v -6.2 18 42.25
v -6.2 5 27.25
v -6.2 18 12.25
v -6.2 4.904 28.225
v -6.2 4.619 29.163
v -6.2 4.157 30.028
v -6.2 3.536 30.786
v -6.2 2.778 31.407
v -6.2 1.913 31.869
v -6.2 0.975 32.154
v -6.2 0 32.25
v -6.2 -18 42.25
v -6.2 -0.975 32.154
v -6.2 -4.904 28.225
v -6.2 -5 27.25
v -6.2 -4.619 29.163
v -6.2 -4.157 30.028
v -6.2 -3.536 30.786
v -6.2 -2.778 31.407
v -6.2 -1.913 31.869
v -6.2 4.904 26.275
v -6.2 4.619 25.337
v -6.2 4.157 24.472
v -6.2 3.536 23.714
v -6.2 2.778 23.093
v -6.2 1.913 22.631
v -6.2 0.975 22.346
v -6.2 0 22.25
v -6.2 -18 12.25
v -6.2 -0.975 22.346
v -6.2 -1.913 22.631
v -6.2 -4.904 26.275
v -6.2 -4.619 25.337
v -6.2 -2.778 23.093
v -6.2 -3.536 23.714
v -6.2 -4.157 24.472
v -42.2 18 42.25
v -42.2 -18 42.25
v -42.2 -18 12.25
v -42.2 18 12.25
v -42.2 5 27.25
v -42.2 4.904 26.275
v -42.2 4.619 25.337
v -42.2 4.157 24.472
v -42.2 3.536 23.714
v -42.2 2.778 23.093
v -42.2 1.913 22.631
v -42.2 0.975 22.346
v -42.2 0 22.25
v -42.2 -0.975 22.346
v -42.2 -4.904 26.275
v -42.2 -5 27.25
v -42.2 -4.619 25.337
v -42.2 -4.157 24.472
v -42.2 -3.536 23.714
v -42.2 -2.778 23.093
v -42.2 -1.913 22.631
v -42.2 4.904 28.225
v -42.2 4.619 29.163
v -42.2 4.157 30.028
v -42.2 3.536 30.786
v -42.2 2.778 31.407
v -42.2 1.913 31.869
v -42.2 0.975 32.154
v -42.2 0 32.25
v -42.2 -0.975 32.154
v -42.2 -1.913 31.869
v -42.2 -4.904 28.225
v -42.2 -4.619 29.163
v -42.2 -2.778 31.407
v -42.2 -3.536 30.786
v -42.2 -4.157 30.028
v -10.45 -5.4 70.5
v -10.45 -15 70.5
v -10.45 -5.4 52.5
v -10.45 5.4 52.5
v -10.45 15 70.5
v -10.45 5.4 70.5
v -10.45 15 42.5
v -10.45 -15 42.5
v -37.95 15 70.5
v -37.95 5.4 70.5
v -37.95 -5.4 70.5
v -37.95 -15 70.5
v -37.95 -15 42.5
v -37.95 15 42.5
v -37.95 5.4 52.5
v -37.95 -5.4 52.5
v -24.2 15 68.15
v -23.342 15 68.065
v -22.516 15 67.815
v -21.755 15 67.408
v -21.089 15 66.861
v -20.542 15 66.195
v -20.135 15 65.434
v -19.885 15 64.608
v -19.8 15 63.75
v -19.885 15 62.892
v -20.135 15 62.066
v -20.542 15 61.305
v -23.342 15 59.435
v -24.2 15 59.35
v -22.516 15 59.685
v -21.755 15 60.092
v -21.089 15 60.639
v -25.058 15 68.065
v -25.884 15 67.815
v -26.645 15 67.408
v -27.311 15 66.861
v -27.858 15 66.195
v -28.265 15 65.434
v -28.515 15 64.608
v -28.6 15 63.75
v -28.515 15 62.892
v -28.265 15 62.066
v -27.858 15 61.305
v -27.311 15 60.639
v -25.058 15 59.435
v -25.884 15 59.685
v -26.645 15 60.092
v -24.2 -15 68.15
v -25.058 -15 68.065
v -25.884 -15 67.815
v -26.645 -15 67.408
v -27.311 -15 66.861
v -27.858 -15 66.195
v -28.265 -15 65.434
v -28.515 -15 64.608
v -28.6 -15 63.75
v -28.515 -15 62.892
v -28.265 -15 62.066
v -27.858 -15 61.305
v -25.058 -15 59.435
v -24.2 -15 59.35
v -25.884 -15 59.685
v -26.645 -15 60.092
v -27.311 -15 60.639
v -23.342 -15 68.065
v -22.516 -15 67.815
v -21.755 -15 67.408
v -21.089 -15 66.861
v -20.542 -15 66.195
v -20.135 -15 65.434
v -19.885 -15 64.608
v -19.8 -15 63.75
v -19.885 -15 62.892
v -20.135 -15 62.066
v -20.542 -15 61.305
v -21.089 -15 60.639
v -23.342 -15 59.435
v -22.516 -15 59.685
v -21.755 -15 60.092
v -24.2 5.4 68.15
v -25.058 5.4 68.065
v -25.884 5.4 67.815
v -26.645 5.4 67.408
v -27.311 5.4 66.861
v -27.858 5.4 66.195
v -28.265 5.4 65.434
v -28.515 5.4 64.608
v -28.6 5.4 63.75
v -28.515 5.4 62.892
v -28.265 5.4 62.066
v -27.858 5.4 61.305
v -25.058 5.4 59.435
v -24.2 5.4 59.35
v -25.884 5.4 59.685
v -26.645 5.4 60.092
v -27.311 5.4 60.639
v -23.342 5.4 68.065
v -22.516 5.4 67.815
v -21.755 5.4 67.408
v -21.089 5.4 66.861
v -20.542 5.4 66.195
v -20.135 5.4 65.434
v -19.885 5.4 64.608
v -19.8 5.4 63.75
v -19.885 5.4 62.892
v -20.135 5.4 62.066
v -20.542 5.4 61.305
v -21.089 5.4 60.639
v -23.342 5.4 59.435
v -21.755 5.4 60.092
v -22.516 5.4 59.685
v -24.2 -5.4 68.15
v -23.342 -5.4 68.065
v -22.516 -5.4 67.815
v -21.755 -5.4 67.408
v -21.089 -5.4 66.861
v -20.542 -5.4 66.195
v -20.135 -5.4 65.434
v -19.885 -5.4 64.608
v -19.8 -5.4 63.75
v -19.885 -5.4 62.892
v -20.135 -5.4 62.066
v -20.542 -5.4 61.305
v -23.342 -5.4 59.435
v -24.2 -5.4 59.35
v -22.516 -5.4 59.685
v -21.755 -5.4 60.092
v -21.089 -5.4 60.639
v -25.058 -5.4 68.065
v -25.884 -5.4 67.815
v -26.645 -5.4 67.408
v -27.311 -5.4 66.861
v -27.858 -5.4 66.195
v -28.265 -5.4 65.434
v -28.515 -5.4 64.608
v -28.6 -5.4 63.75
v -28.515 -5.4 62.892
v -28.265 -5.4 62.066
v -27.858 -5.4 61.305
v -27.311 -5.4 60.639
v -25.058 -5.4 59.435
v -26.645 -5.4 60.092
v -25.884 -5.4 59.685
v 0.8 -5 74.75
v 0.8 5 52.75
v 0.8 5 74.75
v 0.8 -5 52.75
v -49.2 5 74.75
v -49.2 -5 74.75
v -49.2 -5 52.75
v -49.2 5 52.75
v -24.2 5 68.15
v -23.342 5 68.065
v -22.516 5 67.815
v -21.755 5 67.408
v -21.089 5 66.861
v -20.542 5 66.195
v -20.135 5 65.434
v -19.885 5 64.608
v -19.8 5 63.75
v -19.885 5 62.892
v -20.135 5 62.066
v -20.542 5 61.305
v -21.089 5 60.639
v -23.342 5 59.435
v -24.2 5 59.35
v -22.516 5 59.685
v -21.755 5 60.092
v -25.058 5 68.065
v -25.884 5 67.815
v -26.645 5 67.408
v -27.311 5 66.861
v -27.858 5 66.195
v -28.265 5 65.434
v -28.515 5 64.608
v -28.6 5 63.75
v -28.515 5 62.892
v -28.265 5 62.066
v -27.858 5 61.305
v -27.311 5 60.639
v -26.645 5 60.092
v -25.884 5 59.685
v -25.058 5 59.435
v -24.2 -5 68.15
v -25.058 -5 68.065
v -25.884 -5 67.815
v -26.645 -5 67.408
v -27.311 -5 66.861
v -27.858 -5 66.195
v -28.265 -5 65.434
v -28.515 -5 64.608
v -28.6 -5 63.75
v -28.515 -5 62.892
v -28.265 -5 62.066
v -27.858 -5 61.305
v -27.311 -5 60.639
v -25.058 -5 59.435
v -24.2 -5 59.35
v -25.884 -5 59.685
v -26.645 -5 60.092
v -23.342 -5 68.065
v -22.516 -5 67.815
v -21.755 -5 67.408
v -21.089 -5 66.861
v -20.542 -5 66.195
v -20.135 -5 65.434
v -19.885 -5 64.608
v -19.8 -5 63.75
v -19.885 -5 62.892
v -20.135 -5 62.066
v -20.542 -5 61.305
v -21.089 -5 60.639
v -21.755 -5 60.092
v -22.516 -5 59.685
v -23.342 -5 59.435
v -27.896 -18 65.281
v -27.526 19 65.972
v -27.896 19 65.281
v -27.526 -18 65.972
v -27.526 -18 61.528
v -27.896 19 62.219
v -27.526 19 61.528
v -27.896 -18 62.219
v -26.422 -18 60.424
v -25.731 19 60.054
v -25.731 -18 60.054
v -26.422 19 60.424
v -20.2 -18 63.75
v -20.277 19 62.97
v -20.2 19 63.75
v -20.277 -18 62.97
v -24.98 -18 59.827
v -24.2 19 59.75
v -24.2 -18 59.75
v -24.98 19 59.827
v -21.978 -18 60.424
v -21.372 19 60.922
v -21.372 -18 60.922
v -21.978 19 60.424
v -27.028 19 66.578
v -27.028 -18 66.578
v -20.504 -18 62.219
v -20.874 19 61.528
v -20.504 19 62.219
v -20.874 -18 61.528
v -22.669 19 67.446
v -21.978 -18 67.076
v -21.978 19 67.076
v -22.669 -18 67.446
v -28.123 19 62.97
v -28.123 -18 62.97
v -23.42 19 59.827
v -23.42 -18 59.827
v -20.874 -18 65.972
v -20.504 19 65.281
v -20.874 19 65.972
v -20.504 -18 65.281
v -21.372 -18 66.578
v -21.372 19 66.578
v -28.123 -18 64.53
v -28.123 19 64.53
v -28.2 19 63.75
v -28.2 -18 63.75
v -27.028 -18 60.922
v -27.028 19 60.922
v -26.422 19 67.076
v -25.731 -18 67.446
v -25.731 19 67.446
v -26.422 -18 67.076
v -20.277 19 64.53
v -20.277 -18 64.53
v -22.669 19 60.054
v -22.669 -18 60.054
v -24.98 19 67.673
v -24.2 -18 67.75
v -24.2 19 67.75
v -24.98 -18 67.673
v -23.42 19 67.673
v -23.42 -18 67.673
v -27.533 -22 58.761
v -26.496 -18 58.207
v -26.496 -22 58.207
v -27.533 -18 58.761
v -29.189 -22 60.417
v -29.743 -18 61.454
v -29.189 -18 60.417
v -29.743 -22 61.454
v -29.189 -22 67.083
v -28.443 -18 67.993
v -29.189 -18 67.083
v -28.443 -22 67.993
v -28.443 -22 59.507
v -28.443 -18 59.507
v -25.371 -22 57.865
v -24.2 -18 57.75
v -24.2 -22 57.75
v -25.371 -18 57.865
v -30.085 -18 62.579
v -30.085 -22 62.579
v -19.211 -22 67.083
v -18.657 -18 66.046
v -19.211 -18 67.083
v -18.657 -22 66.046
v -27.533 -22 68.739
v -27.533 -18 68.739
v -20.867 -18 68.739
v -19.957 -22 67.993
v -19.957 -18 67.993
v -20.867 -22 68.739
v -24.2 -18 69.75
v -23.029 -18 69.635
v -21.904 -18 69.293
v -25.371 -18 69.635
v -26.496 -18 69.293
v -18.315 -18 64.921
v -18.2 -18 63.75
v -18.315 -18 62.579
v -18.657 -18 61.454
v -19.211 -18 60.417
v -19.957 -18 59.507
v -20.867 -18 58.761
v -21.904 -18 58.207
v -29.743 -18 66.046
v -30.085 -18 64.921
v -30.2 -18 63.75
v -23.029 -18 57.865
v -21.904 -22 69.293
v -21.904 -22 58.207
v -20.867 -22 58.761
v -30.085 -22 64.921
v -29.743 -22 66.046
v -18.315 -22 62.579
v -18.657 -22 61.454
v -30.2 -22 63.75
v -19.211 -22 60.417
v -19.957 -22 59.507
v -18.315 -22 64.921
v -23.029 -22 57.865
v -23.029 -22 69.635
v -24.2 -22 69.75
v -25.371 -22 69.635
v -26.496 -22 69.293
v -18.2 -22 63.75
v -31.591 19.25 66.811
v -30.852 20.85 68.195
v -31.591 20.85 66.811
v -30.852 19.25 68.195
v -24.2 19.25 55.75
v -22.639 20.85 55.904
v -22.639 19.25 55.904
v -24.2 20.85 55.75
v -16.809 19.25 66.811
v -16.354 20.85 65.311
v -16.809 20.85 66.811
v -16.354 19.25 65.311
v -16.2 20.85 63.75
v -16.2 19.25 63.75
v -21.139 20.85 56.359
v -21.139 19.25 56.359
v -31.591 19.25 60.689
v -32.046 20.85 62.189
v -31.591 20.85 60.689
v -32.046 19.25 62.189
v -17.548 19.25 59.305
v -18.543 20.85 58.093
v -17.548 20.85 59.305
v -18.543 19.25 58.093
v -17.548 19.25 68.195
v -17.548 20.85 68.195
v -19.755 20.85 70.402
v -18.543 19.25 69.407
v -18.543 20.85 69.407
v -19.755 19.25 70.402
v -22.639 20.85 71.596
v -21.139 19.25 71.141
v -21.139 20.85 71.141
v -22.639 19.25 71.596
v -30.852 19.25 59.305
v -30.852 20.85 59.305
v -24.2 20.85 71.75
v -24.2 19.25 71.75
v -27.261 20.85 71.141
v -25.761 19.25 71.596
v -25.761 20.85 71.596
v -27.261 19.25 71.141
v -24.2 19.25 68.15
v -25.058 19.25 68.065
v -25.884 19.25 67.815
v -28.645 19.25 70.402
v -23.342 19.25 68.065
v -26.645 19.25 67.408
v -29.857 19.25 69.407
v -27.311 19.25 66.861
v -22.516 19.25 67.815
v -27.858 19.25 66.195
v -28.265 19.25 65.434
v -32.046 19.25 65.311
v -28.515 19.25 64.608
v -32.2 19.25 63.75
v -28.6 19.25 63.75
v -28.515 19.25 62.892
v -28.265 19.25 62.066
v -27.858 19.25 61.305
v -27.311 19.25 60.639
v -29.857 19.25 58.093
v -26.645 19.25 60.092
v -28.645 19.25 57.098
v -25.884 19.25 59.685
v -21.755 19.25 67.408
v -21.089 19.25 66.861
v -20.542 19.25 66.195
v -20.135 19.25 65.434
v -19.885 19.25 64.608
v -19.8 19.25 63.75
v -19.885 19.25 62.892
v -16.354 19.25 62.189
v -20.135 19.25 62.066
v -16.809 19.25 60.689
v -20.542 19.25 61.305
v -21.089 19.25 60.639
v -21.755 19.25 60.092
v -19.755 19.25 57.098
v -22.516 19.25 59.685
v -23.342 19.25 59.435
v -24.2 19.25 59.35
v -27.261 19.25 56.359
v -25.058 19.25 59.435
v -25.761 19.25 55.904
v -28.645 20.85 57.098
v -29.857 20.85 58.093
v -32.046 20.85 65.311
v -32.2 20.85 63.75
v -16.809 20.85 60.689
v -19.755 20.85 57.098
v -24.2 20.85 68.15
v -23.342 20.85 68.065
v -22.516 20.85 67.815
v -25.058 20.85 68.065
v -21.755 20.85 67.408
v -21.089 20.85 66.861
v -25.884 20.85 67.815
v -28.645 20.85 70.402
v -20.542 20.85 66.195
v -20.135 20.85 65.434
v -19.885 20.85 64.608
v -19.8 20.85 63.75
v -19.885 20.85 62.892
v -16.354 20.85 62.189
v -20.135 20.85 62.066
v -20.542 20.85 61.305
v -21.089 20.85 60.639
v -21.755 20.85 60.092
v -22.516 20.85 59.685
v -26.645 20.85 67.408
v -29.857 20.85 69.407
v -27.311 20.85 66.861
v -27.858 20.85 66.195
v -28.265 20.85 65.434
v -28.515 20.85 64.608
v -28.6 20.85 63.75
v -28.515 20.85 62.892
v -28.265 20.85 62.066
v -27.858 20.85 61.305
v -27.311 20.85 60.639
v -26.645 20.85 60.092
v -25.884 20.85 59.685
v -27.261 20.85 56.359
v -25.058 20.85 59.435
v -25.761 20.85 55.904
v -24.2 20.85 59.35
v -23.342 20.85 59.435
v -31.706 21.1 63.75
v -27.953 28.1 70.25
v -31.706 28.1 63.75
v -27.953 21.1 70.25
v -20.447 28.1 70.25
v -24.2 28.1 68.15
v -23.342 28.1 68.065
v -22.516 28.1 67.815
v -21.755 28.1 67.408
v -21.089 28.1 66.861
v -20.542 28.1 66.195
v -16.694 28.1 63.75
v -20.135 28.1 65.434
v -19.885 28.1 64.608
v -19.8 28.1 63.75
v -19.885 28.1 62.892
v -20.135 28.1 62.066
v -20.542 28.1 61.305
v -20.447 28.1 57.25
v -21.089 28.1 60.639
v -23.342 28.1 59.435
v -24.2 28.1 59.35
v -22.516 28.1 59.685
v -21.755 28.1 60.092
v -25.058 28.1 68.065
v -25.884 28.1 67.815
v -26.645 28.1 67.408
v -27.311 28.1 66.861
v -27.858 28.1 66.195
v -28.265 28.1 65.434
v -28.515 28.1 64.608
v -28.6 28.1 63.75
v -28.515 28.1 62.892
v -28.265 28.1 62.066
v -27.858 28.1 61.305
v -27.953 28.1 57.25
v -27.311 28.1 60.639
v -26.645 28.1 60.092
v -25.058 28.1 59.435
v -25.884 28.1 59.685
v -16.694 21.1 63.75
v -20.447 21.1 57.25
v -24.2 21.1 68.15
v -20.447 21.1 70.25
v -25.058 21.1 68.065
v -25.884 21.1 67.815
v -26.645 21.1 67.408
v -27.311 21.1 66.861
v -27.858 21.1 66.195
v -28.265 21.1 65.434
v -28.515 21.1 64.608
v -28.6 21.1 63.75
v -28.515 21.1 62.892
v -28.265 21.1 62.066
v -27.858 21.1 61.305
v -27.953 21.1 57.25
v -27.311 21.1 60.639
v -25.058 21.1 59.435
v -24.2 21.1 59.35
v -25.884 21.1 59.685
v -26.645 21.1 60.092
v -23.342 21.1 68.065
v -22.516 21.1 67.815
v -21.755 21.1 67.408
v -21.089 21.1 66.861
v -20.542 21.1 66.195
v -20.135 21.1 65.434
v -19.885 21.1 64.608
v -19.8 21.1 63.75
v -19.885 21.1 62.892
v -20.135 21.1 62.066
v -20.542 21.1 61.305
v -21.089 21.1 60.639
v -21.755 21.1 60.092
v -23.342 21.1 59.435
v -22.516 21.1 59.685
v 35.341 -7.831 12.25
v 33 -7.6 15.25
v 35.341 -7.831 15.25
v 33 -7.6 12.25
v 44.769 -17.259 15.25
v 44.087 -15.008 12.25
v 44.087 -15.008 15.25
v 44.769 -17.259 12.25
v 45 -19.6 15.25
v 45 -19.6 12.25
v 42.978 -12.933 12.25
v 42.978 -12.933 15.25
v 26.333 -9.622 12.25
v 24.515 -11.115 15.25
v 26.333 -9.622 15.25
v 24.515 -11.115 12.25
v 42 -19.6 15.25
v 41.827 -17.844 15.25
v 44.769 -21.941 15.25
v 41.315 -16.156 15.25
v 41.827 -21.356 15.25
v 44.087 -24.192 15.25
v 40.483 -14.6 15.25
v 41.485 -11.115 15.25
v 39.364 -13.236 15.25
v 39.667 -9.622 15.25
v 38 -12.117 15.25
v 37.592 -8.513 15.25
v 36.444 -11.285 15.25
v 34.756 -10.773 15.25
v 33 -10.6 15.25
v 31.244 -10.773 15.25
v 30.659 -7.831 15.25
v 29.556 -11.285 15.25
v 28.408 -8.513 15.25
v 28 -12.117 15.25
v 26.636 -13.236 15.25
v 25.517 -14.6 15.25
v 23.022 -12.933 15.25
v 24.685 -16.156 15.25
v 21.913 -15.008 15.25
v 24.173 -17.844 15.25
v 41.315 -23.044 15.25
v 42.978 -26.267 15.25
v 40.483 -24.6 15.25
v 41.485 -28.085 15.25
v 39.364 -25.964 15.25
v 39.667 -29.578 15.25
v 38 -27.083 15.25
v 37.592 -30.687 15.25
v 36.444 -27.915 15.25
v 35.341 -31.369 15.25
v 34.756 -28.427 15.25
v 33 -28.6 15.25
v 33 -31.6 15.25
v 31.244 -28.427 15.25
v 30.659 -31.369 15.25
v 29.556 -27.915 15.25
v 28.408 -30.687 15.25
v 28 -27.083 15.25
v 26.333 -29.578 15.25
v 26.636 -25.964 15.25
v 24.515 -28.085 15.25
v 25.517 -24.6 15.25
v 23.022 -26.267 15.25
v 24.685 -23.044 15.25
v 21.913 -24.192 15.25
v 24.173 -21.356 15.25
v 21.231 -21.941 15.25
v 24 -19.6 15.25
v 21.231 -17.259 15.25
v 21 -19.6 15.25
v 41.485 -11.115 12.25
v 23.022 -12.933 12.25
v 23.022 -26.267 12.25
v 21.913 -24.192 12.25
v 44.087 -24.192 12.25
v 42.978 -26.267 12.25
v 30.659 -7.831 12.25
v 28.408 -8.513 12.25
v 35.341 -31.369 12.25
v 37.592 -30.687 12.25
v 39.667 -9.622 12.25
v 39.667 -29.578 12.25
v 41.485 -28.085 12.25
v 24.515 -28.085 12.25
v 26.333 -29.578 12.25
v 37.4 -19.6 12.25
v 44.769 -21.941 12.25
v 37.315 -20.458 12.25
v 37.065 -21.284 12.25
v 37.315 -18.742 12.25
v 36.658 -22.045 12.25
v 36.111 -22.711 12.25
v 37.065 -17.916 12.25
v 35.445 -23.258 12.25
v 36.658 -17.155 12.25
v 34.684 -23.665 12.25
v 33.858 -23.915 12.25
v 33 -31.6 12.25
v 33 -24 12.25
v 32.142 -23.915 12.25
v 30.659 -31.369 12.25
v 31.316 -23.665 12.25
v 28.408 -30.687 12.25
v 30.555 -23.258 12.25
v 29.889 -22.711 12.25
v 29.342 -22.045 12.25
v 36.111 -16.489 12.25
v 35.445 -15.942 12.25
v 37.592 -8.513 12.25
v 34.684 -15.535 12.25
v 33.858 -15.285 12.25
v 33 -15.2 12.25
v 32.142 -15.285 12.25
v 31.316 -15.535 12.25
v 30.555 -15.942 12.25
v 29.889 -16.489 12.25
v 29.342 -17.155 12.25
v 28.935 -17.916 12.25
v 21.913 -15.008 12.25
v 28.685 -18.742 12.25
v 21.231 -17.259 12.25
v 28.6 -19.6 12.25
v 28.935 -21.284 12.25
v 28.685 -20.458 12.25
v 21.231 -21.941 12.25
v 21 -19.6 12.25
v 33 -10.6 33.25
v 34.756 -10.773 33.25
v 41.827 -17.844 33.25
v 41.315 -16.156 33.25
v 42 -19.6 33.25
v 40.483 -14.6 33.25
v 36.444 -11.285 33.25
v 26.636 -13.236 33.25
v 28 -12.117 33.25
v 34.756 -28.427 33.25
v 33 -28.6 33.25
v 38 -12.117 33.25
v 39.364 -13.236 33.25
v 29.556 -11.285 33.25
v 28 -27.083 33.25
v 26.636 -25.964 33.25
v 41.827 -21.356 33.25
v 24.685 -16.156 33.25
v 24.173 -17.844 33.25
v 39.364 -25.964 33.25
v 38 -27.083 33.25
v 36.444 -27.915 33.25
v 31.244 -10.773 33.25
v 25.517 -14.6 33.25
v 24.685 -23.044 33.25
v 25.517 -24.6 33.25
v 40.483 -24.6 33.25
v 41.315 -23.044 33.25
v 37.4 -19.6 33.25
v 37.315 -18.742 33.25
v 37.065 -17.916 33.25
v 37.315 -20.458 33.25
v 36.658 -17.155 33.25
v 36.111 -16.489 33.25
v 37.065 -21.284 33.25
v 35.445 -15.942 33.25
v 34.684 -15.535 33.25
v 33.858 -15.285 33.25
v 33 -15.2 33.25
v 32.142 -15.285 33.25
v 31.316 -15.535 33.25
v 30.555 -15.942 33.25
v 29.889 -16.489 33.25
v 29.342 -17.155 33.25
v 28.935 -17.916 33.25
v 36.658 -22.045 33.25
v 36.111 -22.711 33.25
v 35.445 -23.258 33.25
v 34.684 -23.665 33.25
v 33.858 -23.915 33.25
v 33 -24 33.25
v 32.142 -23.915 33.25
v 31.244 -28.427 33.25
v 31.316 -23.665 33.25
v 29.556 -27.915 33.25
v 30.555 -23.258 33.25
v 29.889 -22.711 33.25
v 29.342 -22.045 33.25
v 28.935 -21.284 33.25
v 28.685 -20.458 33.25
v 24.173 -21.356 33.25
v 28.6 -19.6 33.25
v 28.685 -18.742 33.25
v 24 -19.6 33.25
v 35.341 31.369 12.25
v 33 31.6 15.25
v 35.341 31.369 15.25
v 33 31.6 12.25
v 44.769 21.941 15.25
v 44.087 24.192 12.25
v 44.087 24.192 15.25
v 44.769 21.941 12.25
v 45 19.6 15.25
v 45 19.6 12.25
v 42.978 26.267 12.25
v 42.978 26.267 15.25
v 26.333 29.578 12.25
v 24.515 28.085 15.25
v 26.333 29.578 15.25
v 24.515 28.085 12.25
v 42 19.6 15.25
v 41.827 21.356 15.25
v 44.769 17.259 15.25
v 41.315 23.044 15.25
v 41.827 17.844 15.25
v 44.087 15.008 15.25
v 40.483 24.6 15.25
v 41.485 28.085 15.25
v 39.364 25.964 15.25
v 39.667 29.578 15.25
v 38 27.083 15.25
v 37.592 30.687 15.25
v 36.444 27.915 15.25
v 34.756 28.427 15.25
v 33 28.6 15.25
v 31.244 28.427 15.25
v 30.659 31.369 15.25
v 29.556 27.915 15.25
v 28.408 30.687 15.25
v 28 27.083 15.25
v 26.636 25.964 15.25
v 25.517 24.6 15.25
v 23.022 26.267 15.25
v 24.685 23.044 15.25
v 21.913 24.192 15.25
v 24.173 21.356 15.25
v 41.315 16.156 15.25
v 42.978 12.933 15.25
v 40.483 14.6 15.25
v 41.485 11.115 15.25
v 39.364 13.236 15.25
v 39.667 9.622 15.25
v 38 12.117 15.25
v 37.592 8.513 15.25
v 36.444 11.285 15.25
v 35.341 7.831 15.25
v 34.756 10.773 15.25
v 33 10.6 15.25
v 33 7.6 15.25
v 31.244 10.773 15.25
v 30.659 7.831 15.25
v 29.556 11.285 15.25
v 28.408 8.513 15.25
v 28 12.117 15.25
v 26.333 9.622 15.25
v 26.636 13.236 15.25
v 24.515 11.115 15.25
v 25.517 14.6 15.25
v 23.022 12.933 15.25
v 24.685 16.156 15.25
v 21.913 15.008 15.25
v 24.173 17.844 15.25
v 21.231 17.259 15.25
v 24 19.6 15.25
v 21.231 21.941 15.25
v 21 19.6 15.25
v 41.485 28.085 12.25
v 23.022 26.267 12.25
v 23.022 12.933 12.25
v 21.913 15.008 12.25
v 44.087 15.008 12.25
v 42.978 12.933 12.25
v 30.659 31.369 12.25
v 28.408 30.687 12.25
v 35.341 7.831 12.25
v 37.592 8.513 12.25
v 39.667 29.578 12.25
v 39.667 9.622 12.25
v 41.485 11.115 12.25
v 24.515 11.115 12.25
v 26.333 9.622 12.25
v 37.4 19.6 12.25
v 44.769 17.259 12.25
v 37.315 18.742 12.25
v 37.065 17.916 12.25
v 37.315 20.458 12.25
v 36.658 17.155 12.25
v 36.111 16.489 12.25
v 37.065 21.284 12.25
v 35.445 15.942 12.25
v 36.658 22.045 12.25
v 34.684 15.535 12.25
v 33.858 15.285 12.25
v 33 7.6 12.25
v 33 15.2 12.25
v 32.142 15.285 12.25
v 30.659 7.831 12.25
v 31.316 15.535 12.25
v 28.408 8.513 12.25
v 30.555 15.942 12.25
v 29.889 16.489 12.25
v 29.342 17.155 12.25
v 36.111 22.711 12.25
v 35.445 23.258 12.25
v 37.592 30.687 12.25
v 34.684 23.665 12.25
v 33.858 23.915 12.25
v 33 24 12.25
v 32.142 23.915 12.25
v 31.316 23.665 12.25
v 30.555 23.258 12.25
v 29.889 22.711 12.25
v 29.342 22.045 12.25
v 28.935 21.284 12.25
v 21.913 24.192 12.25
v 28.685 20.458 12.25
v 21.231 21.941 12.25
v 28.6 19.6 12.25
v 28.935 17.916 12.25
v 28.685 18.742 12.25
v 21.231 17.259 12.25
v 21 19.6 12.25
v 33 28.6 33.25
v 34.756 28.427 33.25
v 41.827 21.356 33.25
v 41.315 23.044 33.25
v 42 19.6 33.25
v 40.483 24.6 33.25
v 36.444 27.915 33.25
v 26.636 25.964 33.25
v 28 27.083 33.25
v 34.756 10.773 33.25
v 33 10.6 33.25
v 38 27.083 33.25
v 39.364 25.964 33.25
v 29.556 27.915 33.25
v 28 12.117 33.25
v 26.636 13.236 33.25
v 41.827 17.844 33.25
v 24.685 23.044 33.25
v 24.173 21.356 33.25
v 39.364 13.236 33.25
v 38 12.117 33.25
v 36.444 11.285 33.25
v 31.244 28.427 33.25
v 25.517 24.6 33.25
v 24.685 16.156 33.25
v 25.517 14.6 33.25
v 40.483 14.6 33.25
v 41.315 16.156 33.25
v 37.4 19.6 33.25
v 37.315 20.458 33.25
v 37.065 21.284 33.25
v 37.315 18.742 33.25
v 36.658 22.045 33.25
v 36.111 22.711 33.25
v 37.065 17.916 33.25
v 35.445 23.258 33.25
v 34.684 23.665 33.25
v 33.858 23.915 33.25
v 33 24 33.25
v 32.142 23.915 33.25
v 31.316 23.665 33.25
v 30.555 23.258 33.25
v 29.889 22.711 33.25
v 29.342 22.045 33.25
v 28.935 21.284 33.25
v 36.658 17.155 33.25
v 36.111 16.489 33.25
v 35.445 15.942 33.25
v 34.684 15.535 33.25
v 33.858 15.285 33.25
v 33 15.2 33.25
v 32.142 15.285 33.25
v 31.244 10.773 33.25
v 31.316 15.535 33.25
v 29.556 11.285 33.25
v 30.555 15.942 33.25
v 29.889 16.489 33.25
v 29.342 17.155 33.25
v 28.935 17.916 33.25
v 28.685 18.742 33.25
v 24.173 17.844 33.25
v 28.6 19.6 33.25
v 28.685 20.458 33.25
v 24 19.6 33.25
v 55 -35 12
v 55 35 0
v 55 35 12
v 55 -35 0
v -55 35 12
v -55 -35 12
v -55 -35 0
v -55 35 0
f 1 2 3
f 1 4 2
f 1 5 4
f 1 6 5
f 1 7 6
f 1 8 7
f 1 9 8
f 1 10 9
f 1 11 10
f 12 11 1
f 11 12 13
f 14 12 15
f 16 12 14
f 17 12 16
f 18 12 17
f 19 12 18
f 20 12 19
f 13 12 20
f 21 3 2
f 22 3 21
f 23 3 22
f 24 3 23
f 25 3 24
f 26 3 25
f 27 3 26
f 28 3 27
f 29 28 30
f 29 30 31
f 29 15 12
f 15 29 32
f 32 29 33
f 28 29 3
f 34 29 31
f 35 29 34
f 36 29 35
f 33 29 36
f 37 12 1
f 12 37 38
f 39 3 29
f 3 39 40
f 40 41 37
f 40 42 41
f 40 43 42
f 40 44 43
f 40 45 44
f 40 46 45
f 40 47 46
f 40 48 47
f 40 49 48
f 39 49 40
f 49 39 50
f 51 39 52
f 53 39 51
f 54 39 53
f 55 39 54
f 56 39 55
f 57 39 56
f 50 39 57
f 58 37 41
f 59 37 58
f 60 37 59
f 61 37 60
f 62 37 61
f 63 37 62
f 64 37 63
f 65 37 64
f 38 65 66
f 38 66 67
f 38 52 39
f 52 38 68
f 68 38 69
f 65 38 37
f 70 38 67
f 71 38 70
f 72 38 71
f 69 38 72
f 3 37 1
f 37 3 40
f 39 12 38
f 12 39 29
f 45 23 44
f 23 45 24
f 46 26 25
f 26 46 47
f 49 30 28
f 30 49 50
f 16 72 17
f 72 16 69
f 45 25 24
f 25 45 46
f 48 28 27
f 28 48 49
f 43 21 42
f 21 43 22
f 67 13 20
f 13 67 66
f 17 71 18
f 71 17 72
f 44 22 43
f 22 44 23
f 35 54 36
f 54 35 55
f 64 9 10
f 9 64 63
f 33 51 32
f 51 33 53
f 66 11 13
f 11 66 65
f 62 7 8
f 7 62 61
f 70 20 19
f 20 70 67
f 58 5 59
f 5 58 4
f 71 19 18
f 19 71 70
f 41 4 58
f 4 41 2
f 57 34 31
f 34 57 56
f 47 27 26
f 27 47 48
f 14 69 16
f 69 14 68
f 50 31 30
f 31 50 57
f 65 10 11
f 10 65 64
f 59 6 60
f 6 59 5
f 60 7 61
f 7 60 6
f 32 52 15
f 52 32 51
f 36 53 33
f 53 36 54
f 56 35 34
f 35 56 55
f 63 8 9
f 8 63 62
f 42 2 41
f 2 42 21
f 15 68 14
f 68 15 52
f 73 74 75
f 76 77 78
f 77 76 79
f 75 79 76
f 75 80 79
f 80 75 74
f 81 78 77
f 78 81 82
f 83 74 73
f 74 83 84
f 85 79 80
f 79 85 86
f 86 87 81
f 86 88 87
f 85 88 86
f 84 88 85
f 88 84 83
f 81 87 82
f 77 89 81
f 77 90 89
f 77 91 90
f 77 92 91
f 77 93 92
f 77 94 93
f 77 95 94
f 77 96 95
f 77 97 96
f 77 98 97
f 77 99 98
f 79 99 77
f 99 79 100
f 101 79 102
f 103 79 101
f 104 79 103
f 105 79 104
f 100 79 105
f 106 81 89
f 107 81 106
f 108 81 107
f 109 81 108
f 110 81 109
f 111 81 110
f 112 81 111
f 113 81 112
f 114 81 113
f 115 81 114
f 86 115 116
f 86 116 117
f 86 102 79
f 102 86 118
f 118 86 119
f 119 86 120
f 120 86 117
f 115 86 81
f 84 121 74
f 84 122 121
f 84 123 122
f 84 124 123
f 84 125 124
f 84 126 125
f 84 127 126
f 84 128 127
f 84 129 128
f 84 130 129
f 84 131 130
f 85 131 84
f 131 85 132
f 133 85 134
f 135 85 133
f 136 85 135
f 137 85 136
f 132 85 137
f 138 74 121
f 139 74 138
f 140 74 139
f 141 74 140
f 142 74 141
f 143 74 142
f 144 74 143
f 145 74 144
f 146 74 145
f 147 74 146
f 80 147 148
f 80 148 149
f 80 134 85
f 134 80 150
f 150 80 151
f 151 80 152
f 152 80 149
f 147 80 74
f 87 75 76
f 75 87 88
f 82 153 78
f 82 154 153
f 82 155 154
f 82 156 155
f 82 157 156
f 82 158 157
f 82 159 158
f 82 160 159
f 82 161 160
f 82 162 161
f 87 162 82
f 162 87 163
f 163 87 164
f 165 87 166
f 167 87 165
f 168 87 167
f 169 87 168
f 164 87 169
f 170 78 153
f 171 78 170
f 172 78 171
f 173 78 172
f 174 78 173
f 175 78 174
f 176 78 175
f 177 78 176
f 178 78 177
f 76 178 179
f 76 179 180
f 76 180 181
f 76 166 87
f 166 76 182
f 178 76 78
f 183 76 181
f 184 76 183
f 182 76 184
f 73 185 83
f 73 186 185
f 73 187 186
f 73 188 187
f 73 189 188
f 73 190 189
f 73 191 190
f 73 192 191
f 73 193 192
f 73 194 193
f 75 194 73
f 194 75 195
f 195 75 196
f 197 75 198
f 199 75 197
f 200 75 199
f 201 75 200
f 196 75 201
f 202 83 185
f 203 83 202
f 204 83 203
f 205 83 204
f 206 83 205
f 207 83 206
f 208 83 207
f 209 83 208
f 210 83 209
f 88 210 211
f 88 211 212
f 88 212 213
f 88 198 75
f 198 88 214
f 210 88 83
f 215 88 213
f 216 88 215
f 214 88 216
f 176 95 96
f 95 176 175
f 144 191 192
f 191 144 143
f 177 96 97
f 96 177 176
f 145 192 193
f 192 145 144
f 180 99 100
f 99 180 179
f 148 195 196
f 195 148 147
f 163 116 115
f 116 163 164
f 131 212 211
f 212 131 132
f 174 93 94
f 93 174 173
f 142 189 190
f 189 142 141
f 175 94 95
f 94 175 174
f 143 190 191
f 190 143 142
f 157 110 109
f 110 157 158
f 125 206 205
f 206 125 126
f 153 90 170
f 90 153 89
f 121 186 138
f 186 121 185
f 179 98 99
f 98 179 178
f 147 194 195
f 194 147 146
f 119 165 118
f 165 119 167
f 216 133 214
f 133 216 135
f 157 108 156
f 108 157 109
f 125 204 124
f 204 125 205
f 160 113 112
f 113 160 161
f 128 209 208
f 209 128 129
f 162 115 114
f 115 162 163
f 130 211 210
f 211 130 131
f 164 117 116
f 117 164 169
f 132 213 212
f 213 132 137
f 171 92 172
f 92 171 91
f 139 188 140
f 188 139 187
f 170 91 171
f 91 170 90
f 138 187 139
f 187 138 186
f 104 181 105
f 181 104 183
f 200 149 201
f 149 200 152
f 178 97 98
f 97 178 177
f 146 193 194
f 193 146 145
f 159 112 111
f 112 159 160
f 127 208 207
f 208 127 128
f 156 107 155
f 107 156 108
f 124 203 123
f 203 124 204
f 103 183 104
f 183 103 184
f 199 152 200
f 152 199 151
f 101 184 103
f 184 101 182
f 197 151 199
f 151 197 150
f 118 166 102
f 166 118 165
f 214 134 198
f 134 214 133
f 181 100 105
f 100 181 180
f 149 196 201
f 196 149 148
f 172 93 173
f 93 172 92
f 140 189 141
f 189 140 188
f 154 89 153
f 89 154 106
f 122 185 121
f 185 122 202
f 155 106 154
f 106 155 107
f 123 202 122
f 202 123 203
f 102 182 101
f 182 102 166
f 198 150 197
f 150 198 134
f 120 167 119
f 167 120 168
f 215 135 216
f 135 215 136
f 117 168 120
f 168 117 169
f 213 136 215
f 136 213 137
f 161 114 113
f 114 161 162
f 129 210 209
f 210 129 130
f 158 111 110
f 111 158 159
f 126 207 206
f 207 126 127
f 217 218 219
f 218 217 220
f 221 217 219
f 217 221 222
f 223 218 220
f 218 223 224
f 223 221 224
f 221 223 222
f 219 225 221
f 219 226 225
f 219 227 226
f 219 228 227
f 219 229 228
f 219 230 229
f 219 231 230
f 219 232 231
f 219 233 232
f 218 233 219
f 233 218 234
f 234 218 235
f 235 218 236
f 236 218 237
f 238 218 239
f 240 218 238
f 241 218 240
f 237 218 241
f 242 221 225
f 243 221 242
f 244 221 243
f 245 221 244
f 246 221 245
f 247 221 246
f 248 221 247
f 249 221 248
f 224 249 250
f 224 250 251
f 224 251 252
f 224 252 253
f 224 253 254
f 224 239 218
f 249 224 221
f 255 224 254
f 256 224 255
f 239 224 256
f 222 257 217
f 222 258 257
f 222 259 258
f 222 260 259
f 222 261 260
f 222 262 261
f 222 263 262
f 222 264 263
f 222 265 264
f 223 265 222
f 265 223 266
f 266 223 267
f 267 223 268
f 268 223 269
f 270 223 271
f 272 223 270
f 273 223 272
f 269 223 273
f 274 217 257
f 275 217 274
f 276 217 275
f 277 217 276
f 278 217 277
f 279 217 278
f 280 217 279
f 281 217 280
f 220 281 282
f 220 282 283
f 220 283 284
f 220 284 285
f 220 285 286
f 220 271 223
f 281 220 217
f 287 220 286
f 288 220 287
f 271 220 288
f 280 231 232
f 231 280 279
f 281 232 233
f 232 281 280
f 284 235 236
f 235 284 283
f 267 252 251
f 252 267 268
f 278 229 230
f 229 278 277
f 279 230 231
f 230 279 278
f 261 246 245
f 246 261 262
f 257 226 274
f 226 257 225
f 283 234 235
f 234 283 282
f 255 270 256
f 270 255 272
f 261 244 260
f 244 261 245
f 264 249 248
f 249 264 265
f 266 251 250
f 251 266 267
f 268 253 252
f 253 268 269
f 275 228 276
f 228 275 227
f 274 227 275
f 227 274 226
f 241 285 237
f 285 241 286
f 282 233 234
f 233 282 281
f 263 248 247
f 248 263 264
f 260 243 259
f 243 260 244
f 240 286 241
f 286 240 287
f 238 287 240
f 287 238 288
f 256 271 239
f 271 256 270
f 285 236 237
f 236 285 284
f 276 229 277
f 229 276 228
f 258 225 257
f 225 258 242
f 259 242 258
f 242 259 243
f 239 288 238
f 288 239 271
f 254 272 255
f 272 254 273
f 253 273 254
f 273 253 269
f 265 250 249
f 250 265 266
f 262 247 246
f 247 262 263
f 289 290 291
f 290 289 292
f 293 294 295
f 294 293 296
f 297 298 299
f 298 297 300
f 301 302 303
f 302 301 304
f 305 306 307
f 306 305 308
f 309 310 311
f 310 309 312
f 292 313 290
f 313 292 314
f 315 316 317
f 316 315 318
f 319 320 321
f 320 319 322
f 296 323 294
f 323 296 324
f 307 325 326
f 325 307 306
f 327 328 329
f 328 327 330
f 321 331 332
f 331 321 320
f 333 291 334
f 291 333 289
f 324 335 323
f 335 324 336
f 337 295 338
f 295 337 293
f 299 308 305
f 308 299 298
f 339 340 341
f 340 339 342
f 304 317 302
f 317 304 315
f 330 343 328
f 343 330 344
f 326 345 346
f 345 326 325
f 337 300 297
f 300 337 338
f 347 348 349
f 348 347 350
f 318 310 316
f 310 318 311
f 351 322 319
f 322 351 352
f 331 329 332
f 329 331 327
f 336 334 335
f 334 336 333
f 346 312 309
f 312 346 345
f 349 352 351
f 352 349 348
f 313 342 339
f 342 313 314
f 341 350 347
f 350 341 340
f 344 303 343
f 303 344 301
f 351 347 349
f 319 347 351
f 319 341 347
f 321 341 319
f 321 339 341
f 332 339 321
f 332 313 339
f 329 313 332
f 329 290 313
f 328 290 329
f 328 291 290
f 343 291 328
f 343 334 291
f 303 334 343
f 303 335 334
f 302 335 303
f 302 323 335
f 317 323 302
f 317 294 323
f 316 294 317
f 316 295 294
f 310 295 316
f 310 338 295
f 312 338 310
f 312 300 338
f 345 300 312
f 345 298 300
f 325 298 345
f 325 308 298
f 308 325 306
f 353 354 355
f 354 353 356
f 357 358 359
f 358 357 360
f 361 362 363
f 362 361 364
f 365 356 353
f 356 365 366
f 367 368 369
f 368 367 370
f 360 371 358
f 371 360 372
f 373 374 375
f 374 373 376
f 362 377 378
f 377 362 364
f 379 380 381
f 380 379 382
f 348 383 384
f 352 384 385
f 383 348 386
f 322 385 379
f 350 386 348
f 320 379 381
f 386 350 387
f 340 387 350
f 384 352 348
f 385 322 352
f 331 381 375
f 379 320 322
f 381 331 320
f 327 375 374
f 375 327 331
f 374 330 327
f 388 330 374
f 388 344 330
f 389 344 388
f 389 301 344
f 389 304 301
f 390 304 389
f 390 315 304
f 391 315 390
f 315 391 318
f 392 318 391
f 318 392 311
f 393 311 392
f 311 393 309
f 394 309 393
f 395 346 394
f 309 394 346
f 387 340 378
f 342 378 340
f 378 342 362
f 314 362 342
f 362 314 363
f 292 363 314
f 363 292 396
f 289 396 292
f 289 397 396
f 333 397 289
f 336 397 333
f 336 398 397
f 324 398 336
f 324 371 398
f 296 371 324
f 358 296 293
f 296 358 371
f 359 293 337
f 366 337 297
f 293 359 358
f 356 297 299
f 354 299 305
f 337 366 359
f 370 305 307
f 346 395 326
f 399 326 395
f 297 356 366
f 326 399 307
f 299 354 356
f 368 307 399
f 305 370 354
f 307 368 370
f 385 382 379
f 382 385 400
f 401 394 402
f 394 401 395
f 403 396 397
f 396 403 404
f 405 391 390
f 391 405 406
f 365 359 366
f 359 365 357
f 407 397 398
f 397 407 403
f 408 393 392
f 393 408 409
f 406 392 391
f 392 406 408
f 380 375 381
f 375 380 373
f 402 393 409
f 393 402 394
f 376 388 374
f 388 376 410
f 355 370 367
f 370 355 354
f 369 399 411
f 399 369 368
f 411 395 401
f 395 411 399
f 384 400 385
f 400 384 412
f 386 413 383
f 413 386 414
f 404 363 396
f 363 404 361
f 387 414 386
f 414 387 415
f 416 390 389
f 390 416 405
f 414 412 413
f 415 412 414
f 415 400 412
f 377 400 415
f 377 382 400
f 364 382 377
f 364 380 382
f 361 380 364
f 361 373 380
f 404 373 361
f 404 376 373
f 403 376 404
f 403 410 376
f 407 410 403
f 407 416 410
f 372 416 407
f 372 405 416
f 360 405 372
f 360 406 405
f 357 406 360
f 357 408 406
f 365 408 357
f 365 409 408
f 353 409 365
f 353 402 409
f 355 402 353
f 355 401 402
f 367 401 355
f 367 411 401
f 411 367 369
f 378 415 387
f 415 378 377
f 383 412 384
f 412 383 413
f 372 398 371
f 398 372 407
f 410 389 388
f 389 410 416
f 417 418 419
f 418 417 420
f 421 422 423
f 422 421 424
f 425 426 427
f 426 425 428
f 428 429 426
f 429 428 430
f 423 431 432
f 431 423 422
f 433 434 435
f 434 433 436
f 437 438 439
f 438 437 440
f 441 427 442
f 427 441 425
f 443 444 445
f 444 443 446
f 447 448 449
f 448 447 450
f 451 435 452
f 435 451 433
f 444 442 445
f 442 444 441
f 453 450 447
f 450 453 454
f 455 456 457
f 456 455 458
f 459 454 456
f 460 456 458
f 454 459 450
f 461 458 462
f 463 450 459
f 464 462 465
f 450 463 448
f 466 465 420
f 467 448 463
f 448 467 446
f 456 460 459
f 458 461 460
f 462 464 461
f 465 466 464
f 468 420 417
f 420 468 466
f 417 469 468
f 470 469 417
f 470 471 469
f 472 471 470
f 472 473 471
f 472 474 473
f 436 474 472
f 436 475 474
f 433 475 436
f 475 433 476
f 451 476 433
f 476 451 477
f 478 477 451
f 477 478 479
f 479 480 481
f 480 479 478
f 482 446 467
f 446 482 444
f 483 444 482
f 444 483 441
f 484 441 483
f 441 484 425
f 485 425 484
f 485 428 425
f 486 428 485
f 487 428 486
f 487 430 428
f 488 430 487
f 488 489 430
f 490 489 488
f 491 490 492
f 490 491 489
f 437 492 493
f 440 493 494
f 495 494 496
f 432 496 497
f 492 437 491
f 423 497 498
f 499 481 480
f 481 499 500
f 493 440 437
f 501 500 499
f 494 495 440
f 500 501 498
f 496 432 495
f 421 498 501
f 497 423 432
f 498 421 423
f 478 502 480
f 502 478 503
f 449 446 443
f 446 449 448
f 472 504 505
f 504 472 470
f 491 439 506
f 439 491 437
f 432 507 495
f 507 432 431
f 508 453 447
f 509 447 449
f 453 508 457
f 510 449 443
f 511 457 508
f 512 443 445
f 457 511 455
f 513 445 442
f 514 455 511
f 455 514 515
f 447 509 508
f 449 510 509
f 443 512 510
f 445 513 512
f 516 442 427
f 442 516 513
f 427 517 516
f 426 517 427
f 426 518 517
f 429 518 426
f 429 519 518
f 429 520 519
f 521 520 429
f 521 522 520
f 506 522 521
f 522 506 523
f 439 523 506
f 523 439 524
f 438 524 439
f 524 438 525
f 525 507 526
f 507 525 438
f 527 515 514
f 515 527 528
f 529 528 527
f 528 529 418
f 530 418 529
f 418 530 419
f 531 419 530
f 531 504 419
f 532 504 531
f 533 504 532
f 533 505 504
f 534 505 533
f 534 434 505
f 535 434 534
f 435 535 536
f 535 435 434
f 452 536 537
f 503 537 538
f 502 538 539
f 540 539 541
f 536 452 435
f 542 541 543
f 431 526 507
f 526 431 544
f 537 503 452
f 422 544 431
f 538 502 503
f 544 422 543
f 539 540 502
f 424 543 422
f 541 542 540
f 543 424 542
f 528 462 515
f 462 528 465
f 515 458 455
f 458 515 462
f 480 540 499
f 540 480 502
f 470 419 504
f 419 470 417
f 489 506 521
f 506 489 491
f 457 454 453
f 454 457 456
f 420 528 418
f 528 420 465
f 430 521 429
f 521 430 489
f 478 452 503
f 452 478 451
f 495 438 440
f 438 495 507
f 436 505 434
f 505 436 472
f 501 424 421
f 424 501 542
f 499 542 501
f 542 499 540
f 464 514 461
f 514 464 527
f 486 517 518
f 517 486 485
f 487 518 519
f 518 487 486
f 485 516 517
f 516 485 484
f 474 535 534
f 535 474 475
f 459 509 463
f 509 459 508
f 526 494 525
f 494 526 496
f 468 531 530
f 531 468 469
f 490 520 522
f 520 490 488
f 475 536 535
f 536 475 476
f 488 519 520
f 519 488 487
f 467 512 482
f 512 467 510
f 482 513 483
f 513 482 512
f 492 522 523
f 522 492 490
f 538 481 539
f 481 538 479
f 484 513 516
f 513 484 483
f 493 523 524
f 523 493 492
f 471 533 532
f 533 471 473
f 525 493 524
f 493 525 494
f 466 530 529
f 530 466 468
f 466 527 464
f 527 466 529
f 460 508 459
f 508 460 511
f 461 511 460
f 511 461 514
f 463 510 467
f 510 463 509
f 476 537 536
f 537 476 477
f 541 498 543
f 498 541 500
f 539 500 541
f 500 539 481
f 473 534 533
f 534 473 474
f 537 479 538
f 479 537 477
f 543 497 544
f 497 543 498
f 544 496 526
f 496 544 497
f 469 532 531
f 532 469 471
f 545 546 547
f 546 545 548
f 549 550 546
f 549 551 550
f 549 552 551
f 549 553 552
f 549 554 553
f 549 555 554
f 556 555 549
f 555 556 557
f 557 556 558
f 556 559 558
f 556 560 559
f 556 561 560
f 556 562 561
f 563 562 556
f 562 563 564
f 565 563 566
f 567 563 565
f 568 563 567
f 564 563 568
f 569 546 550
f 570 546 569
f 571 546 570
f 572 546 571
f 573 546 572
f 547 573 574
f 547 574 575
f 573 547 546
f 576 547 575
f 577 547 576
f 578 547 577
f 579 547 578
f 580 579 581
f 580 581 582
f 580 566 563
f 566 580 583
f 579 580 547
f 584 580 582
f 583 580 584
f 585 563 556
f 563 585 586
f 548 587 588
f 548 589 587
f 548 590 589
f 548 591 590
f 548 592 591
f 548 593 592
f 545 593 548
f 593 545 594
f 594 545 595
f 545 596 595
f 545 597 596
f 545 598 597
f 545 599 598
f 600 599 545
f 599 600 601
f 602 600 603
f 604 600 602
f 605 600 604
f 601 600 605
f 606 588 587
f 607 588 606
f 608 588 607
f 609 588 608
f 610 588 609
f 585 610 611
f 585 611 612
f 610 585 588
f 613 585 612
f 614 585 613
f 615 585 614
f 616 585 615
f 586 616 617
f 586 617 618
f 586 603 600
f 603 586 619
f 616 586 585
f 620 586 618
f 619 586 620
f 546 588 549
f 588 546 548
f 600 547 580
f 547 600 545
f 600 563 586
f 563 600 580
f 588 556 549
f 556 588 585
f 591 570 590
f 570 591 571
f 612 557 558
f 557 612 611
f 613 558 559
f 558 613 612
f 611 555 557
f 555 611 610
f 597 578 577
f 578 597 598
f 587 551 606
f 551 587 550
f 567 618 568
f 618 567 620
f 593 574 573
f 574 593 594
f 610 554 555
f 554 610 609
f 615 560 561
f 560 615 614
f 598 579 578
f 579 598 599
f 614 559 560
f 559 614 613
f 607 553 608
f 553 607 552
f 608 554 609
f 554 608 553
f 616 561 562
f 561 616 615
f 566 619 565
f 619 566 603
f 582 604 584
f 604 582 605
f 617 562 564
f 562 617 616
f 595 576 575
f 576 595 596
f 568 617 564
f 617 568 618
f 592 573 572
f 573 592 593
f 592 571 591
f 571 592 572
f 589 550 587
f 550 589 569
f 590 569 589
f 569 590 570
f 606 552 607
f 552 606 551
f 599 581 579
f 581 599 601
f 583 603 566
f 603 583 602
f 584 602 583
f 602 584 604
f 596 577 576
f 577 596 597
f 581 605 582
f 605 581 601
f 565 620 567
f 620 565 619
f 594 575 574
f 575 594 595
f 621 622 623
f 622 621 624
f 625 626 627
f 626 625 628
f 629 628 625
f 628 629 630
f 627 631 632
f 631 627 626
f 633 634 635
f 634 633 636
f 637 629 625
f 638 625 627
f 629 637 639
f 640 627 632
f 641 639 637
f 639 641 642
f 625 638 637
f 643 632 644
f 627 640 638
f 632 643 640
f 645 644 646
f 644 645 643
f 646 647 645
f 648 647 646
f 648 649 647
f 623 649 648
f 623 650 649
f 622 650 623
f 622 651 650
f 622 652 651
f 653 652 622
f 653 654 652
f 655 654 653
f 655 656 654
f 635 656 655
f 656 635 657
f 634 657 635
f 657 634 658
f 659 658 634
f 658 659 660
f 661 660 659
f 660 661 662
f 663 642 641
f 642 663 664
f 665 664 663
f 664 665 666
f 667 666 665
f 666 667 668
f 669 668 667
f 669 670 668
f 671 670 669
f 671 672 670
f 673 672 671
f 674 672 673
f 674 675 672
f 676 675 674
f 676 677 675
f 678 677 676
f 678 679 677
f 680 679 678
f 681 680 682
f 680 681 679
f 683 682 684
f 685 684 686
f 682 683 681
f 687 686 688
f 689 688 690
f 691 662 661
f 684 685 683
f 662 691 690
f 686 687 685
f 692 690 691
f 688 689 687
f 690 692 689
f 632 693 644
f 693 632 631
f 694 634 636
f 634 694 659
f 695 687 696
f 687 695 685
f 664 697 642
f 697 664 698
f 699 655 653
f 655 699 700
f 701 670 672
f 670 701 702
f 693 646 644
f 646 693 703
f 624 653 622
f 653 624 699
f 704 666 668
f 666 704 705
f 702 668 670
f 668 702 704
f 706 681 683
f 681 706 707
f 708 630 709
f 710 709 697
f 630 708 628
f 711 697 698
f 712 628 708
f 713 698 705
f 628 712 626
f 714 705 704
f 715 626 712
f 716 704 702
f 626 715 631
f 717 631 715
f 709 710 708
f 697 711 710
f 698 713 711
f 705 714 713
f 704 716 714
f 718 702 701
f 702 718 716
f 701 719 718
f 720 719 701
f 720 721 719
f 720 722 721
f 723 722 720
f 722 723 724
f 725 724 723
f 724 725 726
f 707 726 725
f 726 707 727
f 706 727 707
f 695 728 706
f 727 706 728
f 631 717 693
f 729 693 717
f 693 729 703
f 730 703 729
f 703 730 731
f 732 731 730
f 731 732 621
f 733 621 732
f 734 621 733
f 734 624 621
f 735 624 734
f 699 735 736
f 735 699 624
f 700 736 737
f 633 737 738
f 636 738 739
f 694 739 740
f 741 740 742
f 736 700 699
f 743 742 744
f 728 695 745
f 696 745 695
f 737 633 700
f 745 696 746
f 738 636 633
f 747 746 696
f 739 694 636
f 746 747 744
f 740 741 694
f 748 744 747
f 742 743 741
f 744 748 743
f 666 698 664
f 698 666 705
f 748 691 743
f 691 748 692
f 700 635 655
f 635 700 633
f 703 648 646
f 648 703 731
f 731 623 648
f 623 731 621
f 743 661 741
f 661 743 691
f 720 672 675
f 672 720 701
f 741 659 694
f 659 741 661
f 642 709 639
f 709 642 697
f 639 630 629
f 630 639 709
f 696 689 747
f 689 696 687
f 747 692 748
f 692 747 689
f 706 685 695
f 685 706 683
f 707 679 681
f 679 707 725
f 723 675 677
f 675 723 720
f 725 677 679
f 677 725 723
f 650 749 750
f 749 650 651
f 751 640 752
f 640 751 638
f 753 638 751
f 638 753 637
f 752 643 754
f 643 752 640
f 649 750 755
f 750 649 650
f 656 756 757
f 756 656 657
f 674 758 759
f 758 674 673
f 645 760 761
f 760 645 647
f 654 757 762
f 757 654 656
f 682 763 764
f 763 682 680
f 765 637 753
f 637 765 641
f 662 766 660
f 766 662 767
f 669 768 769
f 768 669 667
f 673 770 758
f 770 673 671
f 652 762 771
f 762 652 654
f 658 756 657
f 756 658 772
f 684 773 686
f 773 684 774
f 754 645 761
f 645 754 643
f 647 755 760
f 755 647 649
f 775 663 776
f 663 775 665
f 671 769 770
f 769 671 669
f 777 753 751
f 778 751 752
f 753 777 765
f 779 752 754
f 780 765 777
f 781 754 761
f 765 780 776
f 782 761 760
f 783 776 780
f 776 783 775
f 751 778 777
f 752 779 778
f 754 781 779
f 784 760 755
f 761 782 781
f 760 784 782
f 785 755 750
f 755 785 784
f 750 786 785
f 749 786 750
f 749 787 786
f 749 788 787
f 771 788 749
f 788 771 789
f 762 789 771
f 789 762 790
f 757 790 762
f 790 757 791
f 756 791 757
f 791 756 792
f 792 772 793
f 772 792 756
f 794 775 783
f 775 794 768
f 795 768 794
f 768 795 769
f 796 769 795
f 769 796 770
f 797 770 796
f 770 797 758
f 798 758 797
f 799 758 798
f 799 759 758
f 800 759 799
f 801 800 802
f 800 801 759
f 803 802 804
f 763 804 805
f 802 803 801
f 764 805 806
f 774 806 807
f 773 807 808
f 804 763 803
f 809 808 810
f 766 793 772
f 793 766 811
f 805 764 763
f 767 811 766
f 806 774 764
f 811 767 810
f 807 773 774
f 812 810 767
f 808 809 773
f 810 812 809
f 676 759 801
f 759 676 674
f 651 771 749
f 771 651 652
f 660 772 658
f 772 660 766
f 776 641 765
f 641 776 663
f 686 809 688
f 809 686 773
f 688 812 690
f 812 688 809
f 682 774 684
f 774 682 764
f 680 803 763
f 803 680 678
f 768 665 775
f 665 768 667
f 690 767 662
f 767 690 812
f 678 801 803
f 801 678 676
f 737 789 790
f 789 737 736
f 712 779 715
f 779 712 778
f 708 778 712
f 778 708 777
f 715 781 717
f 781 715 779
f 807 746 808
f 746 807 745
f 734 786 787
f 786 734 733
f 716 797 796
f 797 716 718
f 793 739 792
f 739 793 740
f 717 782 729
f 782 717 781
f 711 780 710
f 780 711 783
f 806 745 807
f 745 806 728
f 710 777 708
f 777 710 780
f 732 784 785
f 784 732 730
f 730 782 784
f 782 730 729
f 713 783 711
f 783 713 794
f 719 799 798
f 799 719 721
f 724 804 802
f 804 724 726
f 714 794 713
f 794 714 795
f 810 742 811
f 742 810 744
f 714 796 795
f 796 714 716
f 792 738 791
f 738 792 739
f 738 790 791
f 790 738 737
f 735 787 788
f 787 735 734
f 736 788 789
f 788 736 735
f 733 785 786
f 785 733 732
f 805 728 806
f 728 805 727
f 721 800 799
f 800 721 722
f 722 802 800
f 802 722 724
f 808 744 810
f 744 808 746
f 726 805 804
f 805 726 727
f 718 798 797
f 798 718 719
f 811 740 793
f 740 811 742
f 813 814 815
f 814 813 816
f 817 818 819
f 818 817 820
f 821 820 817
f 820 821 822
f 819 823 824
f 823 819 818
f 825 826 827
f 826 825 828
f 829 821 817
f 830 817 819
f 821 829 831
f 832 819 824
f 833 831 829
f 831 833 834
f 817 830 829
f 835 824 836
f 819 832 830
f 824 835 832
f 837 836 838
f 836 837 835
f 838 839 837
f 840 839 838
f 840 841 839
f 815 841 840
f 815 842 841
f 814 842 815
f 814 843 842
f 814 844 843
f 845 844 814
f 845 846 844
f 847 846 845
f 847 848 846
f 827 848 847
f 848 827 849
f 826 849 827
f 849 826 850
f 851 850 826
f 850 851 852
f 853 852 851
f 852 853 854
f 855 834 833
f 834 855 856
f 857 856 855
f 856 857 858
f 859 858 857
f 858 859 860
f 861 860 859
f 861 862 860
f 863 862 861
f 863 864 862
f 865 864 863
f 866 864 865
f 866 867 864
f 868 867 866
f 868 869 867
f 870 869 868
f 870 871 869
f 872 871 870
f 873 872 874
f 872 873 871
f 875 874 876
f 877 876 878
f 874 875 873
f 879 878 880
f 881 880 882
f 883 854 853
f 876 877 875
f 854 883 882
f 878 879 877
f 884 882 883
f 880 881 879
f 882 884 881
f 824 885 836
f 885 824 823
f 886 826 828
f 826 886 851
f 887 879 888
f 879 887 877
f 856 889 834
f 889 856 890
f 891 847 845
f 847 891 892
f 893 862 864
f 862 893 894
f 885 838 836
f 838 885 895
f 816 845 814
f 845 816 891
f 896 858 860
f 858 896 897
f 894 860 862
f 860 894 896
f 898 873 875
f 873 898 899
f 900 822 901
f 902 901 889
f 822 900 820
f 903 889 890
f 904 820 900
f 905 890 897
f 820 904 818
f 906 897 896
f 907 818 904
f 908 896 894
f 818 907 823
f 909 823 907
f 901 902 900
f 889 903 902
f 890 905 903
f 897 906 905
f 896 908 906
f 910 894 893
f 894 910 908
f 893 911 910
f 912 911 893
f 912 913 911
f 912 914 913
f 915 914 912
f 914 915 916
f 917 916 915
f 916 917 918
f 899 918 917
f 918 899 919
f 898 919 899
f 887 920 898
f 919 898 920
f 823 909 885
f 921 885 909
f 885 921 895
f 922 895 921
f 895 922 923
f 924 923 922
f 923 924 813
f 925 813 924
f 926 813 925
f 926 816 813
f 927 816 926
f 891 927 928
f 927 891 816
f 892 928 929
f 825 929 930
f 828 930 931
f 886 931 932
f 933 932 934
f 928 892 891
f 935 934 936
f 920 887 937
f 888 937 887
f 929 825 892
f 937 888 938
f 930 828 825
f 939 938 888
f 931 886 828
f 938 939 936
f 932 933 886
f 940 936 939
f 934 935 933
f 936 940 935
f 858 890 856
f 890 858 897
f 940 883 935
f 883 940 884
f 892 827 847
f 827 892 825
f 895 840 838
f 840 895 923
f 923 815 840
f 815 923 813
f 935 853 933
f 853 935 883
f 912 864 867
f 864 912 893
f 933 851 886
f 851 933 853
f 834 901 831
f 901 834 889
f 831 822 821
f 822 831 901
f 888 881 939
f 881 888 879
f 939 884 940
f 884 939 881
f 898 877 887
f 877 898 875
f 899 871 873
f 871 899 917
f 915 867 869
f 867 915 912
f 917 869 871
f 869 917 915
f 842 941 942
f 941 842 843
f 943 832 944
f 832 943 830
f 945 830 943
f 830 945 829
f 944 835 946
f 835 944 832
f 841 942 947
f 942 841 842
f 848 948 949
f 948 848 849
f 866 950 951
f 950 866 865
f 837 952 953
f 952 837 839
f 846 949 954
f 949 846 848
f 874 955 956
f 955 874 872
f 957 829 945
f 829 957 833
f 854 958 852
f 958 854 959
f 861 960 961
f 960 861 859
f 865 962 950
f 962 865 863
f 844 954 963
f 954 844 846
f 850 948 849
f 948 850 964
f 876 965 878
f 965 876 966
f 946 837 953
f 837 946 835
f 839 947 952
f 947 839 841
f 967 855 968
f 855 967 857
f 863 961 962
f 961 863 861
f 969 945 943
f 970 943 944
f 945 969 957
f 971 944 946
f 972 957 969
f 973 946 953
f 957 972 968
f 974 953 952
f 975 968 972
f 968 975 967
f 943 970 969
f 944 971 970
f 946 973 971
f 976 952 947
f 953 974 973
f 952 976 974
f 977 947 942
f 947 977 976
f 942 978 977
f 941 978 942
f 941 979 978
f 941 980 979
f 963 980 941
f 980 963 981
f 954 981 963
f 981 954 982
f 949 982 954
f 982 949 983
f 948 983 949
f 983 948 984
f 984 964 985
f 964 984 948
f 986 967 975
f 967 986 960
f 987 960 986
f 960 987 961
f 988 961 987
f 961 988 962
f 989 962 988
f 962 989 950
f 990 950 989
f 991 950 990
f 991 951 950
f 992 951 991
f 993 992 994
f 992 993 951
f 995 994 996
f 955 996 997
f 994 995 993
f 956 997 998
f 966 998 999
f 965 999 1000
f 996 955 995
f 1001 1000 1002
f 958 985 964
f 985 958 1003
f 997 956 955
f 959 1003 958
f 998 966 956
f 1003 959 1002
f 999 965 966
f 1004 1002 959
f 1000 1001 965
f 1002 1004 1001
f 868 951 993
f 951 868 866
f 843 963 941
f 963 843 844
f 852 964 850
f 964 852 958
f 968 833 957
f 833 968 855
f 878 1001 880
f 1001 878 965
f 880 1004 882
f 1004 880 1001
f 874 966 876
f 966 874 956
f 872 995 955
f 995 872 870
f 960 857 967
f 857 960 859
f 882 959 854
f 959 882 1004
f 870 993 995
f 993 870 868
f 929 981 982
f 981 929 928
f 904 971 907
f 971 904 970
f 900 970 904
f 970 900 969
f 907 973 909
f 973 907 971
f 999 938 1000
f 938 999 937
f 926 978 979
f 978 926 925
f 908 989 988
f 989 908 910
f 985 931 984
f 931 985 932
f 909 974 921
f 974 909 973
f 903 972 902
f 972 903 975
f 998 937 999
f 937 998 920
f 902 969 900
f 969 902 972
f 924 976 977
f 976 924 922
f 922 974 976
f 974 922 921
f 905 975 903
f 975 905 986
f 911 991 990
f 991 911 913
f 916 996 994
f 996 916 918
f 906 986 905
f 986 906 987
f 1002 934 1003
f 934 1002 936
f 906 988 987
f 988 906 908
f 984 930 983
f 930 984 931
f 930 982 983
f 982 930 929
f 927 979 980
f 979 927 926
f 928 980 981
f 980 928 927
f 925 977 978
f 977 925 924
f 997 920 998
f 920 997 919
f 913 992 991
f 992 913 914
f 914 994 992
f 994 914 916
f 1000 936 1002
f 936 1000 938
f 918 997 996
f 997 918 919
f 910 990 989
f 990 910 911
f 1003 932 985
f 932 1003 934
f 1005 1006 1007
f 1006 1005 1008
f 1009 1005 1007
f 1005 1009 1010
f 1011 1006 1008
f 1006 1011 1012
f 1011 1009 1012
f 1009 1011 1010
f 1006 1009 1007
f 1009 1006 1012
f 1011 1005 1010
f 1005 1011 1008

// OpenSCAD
$fn = 32;

// ------------------------------------------------------------------------
// Indexing jig: plate 110 x 70 mm, pin d8
// Every part is its own module, assembly() places every instance.
// ------------------------------------------------------------------------

// --- part 1 ---
module jig_plate() {
  difference() {
    translate([-55, -35, 0]) cube([110, 70, 12]);
  }
}

// --- part 2 ---
module locator_block() {
  difference() {
    translate([-18, -18, 0]) cube([36, 36, 30]);
    translate([0, 0, 15]) rotate([0, 90, 0]) cylinder(h = 38, d = 10, center = true);
  }
}

// --- part 3 ---
module index_fork() {
  difference() {
    translate([-13.75, -15, 0]) cube([27.5, 30, 28]);
    translate([-14.75, -5.4, 10]) cube([29.5, 10.8, 19]);
    translate([0, 0, 21.25]) rotate([90, 0, 0]) cylinder(h = 32, d = 8.8, center = true);
  }
}

// --- part 4 ---
module index_arm() {
  difference() {
    translate([-25, -5, 0]) cube([50, 10, 22]);
    translate([0, 0, 11]) rotate([90, 0, 0]) cylinder(h = 12, d = 8.8, center = true);
  }
}

// --- part 5 ---
module index_pin() {
  rotate([0, 90, 0]) cylinder(h = 38, d = 8, center = true);
  translate([-22, 0, 0]) rotate([0, 90, 0]) cylinder(h = 4, d = 12);
}

// --- part 6 ---
module pin_washer() {
  difference() {
      translate([0, 0, 0]) cylinder(h = 1.6, d = 16);
      translate([0, 0, -1]) cylinder(h = 3.6, d = 8.8);
    }
}

// --- part 7 ---
module lock_nut() {
  difference() {
    linear_extrude(height = 7) polygon(points = [[7.506, 0], [3.753, 6.5], [-3.753, 6.5], [-7.506, 0], [-3.753, -6.5], [3.753, -6.5]]);
    translate([0, 0, -1]) cylinder(h = 9, d = 8.8);
  }
}

// --- part 8 ---
module guide_bush_a() {
  difference() {
    union() {
      cylinder(h = 3, d = 24);
      translate([0, 0, 3]) cylinder(h = 18, d = 18);
    }
    translate([0, 0, -1]) cylinder(h = 23, d = 8.8);
  }
}

// --- part 9 ---
module guide_bush_b() {
  difference() {
    union() {
      cylinder(h = 3, d = 24);
      translate([0, 0, 3]) cylinder(h = 18, d = 18);
    }
    translate([0, 0, -1]) cylinder(h = 23, d = 8.8);
  }
}

// --- assembly ---
module assembly() {
  color([0.80, 0.24, 0.20]) translate([0, 0, 0]) rotate([0, 0, 0]) jig_plate();
  color([0.20, 0.45, 0.75]) translate([-24.2, 0, 12.25]) rotate([0, 0, 0]) locator_block();
  color([0.25, 0.62, 0.32]) translate([-24.2, 0, 42.5]) rotate([0, 0, 0]) index_fork();
  color([0.92, 0.70, 0.18]) translate([-24.2, 0, 52.75]) rotate([0, 0, 0]) index_arm();
  color([0.58, 0.35, 0.70]) translate([-24.2, 0, 63.75]) rotate([0, 0, 90]) index_pin();
  color([0.16, 0.66, 0.66]) translate([-24.2, 20.85, 63.75]) rotate([90, 0, 0]) pin_washer();
  color([0.85, 0.48, 0.18]) translate([-24.2, 28.1, 63.75]) rotate([90, 0, 0]) lock_nut();
  color([0.55, 0.60, 0.65]) translate([33, -19.6, 12.25]) rotate([0, 0, 0]) guide_bush_a();
  color([0.75, 0.30, 0.55]) translate([33, 19.6, 12.25]) rotate([0, 0, 0]) guide_bush_b();
}

assembly();
